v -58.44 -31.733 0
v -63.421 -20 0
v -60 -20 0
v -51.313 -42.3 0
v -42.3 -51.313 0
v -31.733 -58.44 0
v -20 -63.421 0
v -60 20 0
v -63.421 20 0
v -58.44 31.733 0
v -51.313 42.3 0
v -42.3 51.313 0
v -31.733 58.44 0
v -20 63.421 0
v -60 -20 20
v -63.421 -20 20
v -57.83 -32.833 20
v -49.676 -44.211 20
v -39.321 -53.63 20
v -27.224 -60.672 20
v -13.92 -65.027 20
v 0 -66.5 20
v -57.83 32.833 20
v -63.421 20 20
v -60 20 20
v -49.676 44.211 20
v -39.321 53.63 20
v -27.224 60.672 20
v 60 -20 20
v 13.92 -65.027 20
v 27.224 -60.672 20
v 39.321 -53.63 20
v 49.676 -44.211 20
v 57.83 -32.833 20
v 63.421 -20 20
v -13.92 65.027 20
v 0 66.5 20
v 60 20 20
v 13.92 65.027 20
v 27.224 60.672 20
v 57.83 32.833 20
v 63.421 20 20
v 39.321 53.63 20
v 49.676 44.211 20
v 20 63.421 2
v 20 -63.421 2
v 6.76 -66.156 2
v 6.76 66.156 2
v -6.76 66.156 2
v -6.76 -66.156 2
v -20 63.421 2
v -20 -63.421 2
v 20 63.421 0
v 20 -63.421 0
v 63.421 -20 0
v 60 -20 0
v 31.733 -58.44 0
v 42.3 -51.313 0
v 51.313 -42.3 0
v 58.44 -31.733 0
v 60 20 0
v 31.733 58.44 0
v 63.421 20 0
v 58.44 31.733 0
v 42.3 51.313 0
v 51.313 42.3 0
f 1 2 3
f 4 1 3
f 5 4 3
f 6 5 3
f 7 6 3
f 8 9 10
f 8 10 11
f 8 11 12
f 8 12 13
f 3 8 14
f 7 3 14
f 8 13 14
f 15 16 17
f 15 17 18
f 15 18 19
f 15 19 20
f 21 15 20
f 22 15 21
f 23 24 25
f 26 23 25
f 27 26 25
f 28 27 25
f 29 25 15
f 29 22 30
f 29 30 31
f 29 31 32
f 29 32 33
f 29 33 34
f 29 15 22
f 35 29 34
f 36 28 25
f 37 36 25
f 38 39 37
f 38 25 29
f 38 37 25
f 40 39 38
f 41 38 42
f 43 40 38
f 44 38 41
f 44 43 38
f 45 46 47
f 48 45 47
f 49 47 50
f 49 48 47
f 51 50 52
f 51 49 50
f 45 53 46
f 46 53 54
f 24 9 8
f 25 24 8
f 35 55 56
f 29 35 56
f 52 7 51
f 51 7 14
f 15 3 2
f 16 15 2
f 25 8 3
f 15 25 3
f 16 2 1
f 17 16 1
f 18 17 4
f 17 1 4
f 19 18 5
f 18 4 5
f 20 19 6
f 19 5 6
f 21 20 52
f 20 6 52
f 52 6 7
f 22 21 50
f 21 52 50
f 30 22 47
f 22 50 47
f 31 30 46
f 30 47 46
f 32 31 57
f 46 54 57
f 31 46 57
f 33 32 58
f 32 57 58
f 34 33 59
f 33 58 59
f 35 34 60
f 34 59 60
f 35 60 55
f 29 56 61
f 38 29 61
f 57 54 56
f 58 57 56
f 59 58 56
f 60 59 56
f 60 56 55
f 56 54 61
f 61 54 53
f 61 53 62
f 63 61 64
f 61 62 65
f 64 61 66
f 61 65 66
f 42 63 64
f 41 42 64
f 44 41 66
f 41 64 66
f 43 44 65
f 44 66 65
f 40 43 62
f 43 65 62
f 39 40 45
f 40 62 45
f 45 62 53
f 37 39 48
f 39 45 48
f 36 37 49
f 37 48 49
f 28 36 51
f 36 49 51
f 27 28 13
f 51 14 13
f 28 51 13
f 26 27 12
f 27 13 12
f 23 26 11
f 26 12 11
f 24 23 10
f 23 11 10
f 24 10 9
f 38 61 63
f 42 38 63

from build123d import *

# Parameters (mm, degrees)
EXTRUDE_1_DEPTH     = 20
CUT_EXTRUDE_1_DEPTH = 2


with BuildPart() as part:
    # 草圖1 → 填料-伸長1 (new body)
    with BuildSketch(Plane.XY):
        with BuildLine():
            Line((-63.421210963, 20), (-60, 20))
            Line((-60, 20), (-60, -20))
            Line((-60, -20), (-63.421210963, -20))
            ThreePointArc((-63.421210963, -20), (0, -66.5), (63.421210963, -20))
            Line((63.421210963, -20), (60, -20))
            Line((60, -20), (60, 20))
            Line((60, 20), (63.421210963, 20))
            ThreePointArc((63.421210963, 20), (0, 66.5), (-63.421210963, 20))
        make_face()
    extrude(amount=EXTRUDE_1_DEPTH)

    # 草圖2 → 除料-伸長1 (cut)
    with BuildSketch(Plane(origin=(0, 0, 0), x_dir=(-1, 0, 0), z_dir=(0, 0, -1))):
        with BuildLine():
            Line((-20, 63.421210963), (-20, -63.421210963))
            ThreePointArc((-20, -63.421210963), (0, -66.5), (20, -63.421210963))
            Line((20, -63.421210963), (20, 63.421210963))
            ThreePointArc((20, 63.421210963), (0, 66.5), (-20, 63.421210963))
        make_face()
    extrude(amount=-CUT_EXTRUDE_1_DEPTH, mode=Mode.SUBTRACT)


solid = part.part
